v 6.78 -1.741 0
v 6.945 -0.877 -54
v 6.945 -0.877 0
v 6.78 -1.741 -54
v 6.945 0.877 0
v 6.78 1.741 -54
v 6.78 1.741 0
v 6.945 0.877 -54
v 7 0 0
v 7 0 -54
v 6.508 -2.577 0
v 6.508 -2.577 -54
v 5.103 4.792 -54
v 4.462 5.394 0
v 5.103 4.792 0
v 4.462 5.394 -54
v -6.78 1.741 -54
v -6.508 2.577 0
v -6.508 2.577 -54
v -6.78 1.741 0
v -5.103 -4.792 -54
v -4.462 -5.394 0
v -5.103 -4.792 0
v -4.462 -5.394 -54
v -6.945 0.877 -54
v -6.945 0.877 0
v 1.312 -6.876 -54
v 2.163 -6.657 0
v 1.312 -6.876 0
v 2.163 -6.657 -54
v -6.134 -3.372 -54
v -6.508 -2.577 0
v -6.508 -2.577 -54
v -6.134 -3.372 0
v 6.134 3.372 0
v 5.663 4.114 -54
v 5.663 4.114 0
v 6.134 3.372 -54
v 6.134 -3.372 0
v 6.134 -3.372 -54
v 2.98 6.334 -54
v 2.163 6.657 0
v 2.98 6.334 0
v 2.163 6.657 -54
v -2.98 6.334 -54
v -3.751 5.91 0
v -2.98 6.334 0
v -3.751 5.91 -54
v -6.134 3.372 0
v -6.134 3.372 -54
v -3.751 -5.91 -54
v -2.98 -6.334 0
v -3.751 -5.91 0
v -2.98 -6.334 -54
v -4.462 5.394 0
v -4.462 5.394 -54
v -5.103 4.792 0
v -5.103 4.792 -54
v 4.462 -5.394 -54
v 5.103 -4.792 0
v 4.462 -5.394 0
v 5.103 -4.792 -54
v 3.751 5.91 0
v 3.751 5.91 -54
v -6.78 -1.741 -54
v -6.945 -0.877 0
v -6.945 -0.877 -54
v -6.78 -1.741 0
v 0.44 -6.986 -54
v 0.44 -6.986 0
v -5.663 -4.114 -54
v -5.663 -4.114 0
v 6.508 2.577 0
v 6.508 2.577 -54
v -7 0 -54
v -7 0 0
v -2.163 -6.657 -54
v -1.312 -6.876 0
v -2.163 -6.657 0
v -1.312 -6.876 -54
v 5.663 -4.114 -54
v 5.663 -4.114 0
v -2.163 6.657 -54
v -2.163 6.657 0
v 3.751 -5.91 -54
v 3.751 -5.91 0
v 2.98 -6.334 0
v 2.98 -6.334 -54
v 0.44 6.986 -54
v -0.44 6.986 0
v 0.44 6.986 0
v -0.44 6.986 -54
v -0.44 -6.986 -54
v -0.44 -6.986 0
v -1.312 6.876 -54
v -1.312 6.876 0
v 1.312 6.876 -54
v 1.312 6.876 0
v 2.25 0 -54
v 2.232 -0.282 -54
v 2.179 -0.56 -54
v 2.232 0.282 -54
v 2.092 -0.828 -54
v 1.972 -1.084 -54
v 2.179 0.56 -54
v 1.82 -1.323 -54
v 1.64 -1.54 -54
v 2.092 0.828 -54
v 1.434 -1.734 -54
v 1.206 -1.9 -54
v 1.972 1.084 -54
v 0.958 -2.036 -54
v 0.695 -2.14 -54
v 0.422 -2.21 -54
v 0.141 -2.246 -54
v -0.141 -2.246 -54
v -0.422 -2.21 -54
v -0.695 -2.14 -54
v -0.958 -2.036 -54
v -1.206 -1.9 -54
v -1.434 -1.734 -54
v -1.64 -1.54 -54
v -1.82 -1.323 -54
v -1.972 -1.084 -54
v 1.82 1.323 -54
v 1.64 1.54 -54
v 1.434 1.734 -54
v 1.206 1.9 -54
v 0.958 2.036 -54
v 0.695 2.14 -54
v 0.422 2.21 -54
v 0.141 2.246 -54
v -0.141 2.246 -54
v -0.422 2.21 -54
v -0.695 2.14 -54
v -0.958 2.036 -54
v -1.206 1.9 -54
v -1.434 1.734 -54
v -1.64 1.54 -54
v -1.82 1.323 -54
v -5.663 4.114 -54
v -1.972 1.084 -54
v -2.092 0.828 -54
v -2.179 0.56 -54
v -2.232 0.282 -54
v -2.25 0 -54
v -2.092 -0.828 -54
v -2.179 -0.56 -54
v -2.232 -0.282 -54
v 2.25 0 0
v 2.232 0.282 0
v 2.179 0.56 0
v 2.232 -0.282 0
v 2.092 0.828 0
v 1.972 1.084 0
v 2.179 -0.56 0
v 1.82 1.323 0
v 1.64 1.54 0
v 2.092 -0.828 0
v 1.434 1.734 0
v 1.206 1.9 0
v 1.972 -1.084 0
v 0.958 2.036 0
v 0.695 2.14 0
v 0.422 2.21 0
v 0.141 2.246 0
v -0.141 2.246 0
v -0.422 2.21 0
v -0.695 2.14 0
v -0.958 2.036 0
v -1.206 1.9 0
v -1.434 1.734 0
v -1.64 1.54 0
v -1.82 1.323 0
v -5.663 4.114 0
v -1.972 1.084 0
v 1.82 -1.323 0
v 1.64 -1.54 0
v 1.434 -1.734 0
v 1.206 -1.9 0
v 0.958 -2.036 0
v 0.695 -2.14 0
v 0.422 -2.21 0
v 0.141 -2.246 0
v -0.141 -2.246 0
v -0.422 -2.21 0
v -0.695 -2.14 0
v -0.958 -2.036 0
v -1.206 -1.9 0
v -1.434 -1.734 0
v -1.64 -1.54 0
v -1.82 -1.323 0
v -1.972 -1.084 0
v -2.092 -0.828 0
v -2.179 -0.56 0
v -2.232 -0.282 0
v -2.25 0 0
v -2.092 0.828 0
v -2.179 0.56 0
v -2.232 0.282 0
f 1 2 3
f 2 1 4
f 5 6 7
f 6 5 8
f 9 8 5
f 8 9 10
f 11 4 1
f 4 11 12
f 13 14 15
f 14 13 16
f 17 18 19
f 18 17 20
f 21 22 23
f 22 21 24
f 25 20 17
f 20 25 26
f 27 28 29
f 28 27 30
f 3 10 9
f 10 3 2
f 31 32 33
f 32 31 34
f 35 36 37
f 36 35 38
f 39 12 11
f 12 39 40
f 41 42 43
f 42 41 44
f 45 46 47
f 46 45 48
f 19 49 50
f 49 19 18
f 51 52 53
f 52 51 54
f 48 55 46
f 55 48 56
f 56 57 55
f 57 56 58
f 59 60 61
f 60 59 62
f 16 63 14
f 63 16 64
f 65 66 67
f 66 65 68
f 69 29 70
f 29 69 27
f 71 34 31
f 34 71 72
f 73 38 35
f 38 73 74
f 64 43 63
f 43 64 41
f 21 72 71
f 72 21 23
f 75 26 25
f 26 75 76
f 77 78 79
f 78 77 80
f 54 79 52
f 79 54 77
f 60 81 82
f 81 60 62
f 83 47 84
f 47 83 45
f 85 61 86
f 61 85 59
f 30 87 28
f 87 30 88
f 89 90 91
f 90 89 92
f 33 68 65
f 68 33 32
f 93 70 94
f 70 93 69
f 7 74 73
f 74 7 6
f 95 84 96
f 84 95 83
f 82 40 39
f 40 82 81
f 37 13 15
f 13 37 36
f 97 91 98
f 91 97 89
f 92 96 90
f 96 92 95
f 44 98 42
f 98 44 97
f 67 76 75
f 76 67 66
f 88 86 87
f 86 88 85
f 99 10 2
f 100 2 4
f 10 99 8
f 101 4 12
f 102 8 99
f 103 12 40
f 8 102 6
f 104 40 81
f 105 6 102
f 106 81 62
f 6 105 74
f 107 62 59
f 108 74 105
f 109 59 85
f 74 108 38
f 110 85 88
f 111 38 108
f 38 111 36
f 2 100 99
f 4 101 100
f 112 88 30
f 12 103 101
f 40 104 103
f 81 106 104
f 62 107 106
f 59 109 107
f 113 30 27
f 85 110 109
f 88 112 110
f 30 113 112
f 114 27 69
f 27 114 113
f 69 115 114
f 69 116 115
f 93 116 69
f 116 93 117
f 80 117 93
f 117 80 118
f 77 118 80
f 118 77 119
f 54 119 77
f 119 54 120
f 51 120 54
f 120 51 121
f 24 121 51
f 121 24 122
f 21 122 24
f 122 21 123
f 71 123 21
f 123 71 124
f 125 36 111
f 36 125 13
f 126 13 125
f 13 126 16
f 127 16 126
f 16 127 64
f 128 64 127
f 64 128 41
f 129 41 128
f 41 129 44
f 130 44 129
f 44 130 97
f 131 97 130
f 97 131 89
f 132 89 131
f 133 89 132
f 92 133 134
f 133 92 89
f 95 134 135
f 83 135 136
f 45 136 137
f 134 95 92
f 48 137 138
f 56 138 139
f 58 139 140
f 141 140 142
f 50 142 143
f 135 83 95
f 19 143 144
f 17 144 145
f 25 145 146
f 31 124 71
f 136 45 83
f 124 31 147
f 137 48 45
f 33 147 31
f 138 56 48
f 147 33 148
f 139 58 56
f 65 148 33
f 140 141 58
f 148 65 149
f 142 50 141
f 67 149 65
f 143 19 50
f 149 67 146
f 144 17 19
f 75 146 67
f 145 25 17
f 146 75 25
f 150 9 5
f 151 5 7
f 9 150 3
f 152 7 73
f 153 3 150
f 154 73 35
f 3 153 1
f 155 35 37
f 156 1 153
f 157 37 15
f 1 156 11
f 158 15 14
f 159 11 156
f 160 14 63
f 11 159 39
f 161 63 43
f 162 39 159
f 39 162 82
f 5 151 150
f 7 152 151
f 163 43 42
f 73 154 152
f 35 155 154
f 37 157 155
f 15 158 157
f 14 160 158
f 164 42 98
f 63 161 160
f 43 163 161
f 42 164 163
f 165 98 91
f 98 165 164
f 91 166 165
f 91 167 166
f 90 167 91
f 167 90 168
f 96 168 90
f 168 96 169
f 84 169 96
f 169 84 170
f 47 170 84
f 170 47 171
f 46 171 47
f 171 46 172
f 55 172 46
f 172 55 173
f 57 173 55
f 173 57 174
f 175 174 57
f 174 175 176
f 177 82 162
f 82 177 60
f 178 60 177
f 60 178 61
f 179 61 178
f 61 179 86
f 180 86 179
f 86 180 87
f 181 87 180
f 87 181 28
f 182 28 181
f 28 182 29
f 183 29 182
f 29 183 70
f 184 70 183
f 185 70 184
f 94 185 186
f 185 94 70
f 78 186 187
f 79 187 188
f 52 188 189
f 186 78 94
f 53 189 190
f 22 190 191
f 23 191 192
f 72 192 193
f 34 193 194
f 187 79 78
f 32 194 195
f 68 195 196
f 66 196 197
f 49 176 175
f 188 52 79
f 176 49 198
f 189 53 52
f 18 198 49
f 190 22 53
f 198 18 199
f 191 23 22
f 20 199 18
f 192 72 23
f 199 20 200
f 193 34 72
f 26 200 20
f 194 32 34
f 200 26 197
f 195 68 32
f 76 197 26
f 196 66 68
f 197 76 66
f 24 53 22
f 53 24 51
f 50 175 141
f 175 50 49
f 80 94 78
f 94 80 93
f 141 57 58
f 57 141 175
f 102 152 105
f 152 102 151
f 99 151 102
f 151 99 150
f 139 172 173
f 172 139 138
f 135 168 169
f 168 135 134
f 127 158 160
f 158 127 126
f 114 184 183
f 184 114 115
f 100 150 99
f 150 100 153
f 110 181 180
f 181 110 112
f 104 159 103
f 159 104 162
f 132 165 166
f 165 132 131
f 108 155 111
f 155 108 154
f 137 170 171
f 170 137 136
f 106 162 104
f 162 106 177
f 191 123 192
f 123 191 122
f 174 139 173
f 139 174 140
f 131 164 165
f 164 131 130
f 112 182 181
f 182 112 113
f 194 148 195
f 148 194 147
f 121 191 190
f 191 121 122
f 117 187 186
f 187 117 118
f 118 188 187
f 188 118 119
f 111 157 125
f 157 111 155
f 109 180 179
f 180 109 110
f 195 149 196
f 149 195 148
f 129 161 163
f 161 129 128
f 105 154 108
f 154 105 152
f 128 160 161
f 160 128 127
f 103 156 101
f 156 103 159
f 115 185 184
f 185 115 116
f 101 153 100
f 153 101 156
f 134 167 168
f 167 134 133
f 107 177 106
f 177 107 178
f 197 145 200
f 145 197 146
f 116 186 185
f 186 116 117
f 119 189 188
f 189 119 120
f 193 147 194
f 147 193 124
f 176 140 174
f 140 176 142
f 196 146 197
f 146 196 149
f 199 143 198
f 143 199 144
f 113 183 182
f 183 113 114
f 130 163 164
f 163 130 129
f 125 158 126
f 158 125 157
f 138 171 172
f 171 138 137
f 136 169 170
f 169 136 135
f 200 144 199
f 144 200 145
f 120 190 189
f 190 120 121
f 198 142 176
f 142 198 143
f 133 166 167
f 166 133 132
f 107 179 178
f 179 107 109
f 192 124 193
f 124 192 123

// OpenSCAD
$fn = 50;


difference() {
	union() {
		translate(v = [0, 0, -54.0000000000]) {
			cylinder(h = 54, r = 7.0000000000);
		}
		cylinder(h = 0, r = 17.0000000000);
	}
	union() {
		#translate(v = [0, 0, -54]) {
			cylinder(h = 54, r = 2.2500000000);
		}
	}
}
